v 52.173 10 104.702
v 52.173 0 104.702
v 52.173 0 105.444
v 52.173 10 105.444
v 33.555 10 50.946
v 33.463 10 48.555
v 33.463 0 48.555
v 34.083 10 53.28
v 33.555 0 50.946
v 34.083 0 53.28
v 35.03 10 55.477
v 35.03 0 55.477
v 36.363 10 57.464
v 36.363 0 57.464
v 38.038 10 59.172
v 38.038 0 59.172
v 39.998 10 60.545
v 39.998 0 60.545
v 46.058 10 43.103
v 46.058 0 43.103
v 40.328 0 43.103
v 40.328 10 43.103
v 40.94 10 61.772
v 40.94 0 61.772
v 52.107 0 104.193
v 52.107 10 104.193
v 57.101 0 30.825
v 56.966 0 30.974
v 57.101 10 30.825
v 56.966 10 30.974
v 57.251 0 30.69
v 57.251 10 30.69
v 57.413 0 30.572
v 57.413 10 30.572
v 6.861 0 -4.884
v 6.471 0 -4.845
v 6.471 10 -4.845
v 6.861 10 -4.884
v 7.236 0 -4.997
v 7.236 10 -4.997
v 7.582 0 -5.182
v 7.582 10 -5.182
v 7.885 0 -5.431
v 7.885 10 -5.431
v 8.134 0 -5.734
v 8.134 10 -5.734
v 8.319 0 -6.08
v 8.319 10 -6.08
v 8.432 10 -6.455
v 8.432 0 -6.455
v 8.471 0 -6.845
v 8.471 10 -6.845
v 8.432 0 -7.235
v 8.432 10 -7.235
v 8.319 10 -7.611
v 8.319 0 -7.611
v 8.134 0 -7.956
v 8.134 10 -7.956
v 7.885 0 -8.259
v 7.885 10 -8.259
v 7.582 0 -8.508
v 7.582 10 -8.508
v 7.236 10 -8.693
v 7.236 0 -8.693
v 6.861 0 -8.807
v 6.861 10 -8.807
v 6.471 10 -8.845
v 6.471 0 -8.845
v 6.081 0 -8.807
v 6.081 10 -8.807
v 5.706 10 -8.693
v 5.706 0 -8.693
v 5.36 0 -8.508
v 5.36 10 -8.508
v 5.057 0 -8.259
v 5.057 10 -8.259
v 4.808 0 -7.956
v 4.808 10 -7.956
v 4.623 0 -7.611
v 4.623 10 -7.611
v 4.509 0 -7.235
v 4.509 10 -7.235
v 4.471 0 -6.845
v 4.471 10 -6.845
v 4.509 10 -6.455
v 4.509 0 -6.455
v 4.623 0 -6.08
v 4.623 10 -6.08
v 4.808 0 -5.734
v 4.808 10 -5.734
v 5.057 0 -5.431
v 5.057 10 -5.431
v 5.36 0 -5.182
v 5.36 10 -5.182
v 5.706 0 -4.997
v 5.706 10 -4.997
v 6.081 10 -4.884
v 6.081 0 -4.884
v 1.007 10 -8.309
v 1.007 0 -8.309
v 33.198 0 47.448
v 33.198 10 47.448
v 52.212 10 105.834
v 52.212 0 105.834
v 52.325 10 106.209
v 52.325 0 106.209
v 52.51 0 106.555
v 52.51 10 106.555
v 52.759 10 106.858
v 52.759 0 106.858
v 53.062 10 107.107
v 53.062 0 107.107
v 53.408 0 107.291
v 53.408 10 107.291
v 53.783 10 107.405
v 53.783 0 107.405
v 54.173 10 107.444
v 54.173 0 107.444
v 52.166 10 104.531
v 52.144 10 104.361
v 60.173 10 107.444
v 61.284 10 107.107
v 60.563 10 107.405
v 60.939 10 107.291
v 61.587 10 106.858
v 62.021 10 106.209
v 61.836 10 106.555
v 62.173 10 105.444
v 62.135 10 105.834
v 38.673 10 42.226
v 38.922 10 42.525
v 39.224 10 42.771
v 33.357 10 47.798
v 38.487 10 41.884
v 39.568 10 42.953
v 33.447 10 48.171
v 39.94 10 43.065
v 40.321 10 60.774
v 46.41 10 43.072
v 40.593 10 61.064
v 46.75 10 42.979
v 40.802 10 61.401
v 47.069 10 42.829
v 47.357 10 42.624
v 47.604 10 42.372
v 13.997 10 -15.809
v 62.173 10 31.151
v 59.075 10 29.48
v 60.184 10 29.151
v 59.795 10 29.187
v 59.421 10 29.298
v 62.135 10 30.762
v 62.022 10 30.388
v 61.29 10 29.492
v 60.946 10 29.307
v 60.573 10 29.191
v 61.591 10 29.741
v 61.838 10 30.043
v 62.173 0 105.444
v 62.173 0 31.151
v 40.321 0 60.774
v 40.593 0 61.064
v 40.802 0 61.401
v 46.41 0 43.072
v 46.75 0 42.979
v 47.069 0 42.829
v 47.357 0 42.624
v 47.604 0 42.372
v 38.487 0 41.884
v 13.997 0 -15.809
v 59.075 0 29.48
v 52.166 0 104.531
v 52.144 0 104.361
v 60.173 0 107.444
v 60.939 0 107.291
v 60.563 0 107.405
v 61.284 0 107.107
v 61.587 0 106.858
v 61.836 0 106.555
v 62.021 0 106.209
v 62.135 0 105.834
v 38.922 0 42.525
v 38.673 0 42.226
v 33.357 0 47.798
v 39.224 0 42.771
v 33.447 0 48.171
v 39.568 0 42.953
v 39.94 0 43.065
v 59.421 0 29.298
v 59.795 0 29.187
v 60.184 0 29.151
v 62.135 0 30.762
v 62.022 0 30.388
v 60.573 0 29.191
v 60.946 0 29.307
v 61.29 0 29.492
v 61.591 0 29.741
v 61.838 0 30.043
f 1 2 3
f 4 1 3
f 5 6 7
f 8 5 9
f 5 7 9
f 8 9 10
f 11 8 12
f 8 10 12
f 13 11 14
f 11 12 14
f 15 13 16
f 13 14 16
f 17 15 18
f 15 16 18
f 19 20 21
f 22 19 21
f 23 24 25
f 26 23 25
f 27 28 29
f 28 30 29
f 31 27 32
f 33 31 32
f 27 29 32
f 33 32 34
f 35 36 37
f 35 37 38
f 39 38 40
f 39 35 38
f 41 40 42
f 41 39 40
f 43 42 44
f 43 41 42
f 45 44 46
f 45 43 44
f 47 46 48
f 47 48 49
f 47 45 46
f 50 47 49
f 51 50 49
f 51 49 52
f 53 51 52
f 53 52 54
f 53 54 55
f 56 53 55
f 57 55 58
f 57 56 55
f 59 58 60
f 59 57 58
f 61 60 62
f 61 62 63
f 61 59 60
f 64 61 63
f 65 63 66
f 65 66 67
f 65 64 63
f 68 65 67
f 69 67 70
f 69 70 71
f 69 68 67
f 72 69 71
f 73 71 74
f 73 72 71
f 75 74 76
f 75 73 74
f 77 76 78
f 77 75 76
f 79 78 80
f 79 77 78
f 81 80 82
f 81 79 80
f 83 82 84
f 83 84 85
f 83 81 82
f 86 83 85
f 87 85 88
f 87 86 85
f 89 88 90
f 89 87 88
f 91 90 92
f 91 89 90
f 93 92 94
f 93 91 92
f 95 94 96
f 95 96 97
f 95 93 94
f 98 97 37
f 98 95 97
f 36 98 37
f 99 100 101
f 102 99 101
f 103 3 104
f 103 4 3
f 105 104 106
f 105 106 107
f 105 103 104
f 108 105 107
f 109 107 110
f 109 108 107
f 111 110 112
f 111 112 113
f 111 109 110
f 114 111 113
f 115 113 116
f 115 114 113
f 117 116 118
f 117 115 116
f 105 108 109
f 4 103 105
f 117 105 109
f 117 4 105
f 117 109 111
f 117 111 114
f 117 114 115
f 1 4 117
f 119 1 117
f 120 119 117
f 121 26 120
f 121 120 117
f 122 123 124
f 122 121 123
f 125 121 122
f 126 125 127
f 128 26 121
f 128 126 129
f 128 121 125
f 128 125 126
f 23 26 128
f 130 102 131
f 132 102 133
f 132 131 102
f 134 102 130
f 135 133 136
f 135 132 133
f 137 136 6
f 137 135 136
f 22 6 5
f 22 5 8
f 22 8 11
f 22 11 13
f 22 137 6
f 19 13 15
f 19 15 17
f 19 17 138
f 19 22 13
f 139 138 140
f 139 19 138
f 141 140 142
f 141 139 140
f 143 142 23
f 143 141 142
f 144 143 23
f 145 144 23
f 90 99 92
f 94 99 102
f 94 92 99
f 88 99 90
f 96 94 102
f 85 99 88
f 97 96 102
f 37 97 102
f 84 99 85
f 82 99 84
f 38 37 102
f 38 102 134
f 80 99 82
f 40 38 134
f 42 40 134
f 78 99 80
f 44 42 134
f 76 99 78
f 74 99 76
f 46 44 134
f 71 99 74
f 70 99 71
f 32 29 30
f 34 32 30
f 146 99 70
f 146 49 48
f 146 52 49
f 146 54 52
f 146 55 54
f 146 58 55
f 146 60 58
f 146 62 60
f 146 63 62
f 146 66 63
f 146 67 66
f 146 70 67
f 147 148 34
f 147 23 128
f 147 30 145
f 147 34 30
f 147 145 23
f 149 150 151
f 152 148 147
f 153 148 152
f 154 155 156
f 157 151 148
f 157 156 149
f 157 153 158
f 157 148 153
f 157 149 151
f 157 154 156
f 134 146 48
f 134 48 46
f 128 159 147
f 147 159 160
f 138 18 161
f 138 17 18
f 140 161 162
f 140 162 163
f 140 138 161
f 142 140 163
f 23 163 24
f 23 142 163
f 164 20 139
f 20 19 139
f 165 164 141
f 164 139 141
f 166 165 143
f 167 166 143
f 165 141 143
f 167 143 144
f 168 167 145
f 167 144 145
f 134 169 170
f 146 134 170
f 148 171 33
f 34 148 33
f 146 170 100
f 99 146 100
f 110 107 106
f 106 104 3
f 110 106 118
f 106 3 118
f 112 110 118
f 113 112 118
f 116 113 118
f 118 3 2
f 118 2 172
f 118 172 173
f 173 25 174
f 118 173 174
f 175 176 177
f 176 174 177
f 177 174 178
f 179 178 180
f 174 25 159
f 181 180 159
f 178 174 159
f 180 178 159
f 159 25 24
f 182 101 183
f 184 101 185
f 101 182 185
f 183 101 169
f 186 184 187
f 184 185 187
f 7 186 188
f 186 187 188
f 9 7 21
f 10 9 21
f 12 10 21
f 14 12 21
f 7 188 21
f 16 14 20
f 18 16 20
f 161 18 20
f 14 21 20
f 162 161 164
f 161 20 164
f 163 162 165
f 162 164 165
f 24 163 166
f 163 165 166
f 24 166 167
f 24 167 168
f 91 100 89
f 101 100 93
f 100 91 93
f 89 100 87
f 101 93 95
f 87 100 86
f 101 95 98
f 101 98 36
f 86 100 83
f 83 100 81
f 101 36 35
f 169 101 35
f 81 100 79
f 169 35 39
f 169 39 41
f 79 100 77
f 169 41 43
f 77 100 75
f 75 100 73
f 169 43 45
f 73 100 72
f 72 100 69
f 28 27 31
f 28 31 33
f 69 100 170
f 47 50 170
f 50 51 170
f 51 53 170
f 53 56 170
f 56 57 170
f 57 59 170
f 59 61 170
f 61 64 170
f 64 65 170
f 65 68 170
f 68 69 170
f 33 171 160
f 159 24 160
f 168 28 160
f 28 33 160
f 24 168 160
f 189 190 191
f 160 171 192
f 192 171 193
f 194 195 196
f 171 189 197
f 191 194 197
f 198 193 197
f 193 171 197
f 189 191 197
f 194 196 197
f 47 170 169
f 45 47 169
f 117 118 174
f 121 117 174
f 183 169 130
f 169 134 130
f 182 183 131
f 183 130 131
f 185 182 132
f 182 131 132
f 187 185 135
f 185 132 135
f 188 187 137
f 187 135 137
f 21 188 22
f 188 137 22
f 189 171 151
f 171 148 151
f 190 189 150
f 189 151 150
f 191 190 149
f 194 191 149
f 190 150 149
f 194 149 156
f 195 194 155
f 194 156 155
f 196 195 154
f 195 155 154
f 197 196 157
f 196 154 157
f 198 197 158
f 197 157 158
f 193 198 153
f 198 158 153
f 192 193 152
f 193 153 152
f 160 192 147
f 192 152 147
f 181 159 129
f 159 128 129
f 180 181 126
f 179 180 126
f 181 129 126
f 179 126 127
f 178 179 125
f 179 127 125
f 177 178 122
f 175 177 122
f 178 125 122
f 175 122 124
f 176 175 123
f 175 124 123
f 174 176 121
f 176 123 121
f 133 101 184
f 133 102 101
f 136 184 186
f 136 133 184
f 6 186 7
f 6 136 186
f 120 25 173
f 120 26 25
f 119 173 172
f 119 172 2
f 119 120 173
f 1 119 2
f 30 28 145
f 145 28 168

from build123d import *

# Parameters (mm, degrees)
SKETCH1_R           = 2
BOSS_EXTRUDE1_DEPTH = 10
FILLET1_R           = 2


with BuildPart() as part:
    # Sketch1 → Boss-Extrude1 (new body)
    with BuildSketch(Plane(origin=(0, 0, 0), x_dir=(1, 0, 0), z_dir=(0, 1, 0))):
        with BuildLine():
            Line((13.99715319, 15.809310821), (1.006772133, 8.309310821))
            Line((1.006772133, 8.309310821), (33.506772133, -47.982340425))
            ThreePointArc((33.506772133, -47.982340425), (35.087704929, -55.582092399), (40.71773761, -60.926090021))
            Line((40.71773761, -60.926090021), (52.173142167, -104.443600363))
            Line((52.173142167, -104.443600363), (52.173142167, -107.443600363))
            Line((52.173142167, -107.443600363), (62.173142167, -107.443600363))
            Line((62.173142167, -107.443600363), (62.173142167, -27.443600363))
            Line((62.173142167, -27.443600363), (57.158909288, -30.738667683))
            Line((57.158909288, -30.738667683), (47.003945413, -43.1029998))
            Line((47.003945413, -43.1029998), (39.003945413, -43.1029998))
            Line((39.003945413, -43.1029998), (13.99715319, 15.809310821))
        make_face()
        with Locations(Location((6.470873748, 6.845209206, 0), (0, 0, 270))):
            Circle(SKETCH1_R, mode=Mode.SUBTRACT)
    extrude(amount=BOSS_EXTRUDE1_DEPTH)

    # Fillet1
    fillet1_edges = [part.edges().sort_by_distance(p)[0] for p in [
        (39.003945413, 5, 43.1029998),
        (47.003945413, 5, 43.1029998),
        (57.158909288, 5, 30.738667683),
        (62.173142167, 5, 27.443600363),
        (62.173142167, 5, 107.443600363),
        (52.173142167, 5, 107.443600363),
        (52.173142167, 5, 104.443600363),
        (40.71773761, 5, 60.926090021),
        (33.506772133, 5, 47.982340425),
    ]]
    fillet(fillet1_edges, radius=FILLET1_R)


solid = part.part
